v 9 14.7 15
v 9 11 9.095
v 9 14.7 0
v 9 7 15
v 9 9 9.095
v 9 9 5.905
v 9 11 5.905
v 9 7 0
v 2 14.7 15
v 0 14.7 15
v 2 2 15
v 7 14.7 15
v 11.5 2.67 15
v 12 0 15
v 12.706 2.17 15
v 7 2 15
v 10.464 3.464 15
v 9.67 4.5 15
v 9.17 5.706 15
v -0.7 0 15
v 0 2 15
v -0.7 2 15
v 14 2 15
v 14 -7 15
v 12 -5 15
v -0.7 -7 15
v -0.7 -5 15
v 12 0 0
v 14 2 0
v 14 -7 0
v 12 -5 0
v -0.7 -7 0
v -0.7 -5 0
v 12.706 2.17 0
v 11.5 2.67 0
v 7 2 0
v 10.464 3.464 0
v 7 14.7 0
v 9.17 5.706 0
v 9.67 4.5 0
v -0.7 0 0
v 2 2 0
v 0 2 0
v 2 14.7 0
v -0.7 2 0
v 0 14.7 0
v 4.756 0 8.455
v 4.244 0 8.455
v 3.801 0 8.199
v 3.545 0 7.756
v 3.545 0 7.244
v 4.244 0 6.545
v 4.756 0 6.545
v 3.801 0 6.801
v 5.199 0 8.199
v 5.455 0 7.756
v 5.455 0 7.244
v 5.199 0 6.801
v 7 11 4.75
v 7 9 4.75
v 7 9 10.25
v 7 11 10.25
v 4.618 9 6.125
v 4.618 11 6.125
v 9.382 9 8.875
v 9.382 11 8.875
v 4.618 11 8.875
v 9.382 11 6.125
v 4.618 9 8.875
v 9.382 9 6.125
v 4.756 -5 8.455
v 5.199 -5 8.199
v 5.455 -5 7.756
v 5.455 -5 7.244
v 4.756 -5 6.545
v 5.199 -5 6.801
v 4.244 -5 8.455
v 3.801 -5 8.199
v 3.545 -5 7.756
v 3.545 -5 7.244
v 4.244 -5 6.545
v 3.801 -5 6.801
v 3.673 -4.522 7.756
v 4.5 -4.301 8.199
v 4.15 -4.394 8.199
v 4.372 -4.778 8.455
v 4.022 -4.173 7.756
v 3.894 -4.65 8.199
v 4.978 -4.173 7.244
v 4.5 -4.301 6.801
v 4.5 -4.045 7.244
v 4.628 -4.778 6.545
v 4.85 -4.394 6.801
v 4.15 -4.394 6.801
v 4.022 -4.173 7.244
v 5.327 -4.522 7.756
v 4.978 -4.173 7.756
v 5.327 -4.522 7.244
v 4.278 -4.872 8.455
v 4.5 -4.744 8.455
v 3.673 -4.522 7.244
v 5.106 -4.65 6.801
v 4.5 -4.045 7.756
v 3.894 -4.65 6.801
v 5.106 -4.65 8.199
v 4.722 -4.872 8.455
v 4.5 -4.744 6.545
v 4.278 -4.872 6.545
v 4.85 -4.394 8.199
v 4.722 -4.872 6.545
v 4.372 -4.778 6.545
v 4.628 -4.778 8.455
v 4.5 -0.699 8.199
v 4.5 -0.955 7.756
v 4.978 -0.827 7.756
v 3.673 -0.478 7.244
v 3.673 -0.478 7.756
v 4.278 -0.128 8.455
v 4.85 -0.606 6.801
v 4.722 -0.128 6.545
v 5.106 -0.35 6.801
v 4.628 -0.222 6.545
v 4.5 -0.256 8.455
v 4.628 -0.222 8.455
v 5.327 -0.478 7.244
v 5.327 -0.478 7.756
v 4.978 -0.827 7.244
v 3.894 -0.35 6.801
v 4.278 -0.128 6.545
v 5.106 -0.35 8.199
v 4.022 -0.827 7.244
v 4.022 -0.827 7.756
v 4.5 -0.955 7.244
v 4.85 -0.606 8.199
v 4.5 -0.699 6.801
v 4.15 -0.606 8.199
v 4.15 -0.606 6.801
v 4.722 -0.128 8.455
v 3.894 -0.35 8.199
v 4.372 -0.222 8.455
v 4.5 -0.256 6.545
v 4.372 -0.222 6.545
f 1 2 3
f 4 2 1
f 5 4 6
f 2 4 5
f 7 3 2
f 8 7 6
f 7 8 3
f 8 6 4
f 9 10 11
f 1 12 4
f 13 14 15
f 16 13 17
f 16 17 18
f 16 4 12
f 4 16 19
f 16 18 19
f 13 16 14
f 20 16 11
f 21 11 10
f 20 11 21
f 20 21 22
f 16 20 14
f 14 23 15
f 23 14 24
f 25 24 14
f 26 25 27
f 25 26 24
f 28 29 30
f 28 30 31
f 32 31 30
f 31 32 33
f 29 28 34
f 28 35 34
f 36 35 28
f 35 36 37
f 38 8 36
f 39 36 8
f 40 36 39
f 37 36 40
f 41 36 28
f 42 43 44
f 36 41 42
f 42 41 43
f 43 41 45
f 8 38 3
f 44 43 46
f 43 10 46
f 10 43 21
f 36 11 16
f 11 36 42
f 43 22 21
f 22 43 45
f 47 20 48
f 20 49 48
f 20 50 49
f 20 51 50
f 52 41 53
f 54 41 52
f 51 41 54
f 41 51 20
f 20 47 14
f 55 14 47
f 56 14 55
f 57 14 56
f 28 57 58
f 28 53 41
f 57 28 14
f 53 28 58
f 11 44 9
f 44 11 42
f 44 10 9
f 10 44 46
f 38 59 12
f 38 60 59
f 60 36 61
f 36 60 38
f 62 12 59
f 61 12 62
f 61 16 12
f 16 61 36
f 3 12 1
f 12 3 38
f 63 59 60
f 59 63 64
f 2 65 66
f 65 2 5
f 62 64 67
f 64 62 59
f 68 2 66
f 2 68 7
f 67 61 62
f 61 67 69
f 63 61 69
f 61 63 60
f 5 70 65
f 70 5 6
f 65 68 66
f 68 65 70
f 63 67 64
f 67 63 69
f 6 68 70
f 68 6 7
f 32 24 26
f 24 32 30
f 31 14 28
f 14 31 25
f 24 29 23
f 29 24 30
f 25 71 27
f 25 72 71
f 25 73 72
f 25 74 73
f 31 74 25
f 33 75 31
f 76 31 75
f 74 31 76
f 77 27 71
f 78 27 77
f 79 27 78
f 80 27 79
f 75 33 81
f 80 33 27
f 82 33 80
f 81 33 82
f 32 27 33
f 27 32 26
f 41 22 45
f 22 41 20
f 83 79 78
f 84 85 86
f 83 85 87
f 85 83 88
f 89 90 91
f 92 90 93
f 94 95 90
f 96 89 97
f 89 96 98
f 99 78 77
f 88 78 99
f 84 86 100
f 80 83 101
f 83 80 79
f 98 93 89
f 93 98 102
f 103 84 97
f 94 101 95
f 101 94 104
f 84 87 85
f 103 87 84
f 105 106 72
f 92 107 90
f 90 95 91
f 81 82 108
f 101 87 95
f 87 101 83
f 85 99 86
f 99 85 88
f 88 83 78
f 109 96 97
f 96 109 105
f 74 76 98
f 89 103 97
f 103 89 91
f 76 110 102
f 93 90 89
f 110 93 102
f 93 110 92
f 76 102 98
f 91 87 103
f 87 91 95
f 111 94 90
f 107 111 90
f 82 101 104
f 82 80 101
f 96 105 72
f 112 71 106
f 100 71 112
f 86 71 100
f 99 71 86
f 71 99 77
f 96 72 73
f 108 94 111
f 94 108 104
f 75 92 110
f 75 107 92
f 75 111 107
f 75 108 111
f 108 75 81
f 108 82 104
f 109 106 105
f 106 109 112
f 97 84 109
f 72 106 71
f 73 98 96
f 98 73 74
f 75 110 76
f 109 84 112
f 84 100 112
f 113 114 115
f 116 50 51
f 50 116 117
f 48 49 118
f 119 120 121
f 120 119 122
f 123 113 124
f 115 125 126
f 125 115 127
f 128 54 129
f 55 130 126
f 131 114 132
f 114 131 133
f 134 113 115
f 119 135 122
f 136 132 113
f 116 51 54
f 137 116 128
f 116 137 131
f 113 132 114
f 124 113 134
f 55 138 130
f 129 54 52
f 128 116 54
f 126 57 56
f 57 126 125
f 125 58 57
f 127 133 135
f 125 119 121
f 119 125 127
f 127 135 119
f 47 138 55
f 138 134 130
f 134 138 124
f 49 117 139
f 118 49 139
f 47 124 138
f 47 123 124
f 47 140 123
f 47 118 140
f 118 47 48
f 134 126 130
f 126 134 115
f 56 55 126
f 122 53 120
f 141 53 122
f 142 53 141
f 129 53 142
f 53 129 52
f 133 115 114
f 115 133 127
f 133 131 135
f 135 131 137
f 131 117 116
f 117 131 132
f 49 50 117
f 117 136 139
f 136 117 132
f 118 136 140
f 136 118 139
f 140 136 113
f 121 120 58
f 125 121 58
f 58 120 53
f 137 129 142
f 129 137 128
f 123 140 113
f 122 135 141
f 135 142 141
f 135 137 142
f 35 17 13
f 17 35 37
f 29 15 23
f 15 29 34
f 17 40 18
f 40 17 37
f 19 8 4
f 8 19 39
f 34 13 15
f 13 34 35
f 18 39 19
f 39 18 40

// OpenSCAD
goldenratio = 1.61803399;
joinfactor = 0.125;

gDefaultExtent = 25.4/2; 
gDefaultGap = 5; // MakerBot plywood
gDefaultThickness = 2;
gDefaultLength = 15;

gMakerBotDoubleSlotLength = 50;

	gDefaultSlotDepth = 5;

//TSlotPin();
//ScrewHoleUClip(gDefaultLength, gDefaultExtent, gDefaultThickness, gDefaultGap);
//UClip(gDefaultLength, gDefaultExtent, gDefaultThickness, gDefaultGap); 
//TSlotClip(gDefaultLength, gDefaultExtent, gDefaultThickness, gDefaultGap);
//LTSlotClip(gDefaultLength, gDefaultExtent, gDefaultThickness, gDefaultGap);

//LLockClip(gDefaultLength, gDefaultExtent, gDefaultThickness, gDefaultGap); 
LLockClipSupported(gDefaultLength, gDefaultExtent, gDefaultThickness, gDefaultGap); 
//LLockClipStacker(gDefaultLength, gDefaultExtent, gDefaultThickness, gDefaultGap); 



module TSlotPin()
{
	grabbergap = 2;

	slotdepth = gDefaultSlotDepth;
	slotheight = 11.25;
	slotwidth = 3.2;

	snapdepth = (slotdepth/2)-(grabbergap/2) ;

	crossbeamlength = 5.5;
	crossbeambaseheight = 7;
	crossbeamheight = 3.2;


	union()
	{
		// Base
		translate([-slotwidth/2, 0, 0])
		cube(size=[slotwidth, slotdepth, slotheight*0.2]);

		// Front snap
		translate([-slotwidth/2, 0, 0])
		cube(size=[slotwidth, snapdepth, slotheight]);
		
		// cross beam
		translate([-crossbeamlength/2, 0, crossbeambaseheight])
		cube(size=[crossbeamlength, snapdepth, crossbeamheight]);
		
		translate([0, snapdepth-0.25, crossbeambaseheight+crossbeamheight/2])
		sphere(r=grabbergap/2, $fn=12);

		// Rear release
		translate([-slotwidth/2, slotdepth-snapdepth, 0])
		cube(size=[slotwidth, snapdepth, slotheight]);
		
		translate([0, slotdepth-snapdepth+0.25, crossbeambaseheight+crossbeamheight/2])
		sphere(r=grabbergap/2, $fn=12);

	}
}



// This clip is meant to fit within a cutout slot 
// It has a tab for the cutout on one side
// and a slot for the panel on the other side
module UClip(length, extent, thickness, gap)
{
baselength = 2*thickness+gap;

tablength = 5.25;
tabheight = 10;
tabwidth = gap;

	union()
	{
		// Base wall along x-axis
		cube(size=[baselength, thickness, length]);

		// Panel clip along y-axis
		translate([0, thickness-0.25, 0])
		cube(size=[thickness, extent+0.25, length]);
		translate([thickness+gap, thickness-0.25, 0])
		cube(size=[thickness, extent+0.25, length]);
	}
}

module TSlotClip(length, extent, thickness, gap)
{
	rotate([90,0,0])
	UClip(length, extent, thickness, gap);

	translate([((thickness*2+gap)-gDefaultSlotDepth)/2, -length/2,+0.25])
	rotate([180,0,90])
	TSlotPin();
}

module LTSlotClip(length, extent, thickness, gap)
{
	//rotate([90,0,0])
	UClip(length, extent, thickness, gap);

	//translate([((thickness*2+gap)-gDefaultSlotDepth)/2, -length/2,+0.25])
	translate([(thickness*2+gap)-0.25, gDefaultSlotDepth, length /2])
	rotate([0,-90,180])
	TSlotPin();
}

module TSlotUClip(length, extent, thickness, gap)
{
	crossbeamlength = 5.5;
	crossbeambaseheight = 7;
	crossbeamheight = 3.2;

	// Lay down the basic UClip that will hold onto the T-slot
	UClip(length, extent, thickness, gap);

	// Add a key for the TSlot
	// Just a small piece of 6-sided cylinder
	// Placed in the right position
	translate([thickness+gap, thickness*2+crossbeambaseheight,length/2])
	rotate([90,30,0])
	color([0,0,1]) cylinder(r=crossbeamlength/2, h=thickness, $fn=6);

}

module ScrewHoleUClip(length, extent, thickness, gap, screwdiameter)
{
	screwoffset = 7.5;

	union()
	{
		UClip(length, extent, thickness, gap);
		
		// Place two dimples to snap into the screw hole
		translate([thickness, thickness+screwoffset, length/2])
		sphere(r=screwdiameter/2/goldenratio, $fn=12);
	
		translate([thickness+gap, thickness+screwoffset, length/2])
		sphere(r=screwdiameter/2/goldenratio, $fn=12);
	}
}

// This clip is designed to fit into the T-Slot that is formed by 
// the capture nut slot in laser cut wood designs.  It has an offset
// which is typical of these designs, as they are not corner connected.
module LLockClip(length, extent, thickness, gap)
{
	paneloffset = 5;

	screwdiameter = 3.2;

	crossbeamlength = 5.5;
	crossbeambaseheight = 7;
	crossbeamheight = 3.2;

	// UClip for a T-Slot
	TSlotUClip(length, extent, thickness, gap);

	// Do another UClip with an Opposing L orientation
	rotate([0,0,90])
	translate([(-thickness)-gap,-paneloffset-thickness*2-gap,0])
	ScrewHoleUClip(length, extent, thickness, gap, screwdiameter);
}

module LLockClipSupported(length, extent, thickness, gap)
{
	paneloffset = 5;

	difference()
	{
		union()
		{
			LLockClip(length, extent, thickness, gap);
		
			translate([gap+thickness*2, thickness, 0])
			cube(size=[paneloffset, paneloffset, length]);
		}

		translate([+(paneloffset)+gap+thickness*2, thickness+(paneloffset), -joinfactor])
		cylinder(r=paneloffset, h=length+2*joinfactor, $fn=24);
	}
}

module LLockClipStacker(length, extent, thickness, gap)
{
	LLockClip(length, extent, thickness, gap);

	// Another TSlotClip on the other side
	rotate([0,180,180])
	translate([0, gap,-length])
	TSlotUClip(length, extent, thickness, gap);

}
